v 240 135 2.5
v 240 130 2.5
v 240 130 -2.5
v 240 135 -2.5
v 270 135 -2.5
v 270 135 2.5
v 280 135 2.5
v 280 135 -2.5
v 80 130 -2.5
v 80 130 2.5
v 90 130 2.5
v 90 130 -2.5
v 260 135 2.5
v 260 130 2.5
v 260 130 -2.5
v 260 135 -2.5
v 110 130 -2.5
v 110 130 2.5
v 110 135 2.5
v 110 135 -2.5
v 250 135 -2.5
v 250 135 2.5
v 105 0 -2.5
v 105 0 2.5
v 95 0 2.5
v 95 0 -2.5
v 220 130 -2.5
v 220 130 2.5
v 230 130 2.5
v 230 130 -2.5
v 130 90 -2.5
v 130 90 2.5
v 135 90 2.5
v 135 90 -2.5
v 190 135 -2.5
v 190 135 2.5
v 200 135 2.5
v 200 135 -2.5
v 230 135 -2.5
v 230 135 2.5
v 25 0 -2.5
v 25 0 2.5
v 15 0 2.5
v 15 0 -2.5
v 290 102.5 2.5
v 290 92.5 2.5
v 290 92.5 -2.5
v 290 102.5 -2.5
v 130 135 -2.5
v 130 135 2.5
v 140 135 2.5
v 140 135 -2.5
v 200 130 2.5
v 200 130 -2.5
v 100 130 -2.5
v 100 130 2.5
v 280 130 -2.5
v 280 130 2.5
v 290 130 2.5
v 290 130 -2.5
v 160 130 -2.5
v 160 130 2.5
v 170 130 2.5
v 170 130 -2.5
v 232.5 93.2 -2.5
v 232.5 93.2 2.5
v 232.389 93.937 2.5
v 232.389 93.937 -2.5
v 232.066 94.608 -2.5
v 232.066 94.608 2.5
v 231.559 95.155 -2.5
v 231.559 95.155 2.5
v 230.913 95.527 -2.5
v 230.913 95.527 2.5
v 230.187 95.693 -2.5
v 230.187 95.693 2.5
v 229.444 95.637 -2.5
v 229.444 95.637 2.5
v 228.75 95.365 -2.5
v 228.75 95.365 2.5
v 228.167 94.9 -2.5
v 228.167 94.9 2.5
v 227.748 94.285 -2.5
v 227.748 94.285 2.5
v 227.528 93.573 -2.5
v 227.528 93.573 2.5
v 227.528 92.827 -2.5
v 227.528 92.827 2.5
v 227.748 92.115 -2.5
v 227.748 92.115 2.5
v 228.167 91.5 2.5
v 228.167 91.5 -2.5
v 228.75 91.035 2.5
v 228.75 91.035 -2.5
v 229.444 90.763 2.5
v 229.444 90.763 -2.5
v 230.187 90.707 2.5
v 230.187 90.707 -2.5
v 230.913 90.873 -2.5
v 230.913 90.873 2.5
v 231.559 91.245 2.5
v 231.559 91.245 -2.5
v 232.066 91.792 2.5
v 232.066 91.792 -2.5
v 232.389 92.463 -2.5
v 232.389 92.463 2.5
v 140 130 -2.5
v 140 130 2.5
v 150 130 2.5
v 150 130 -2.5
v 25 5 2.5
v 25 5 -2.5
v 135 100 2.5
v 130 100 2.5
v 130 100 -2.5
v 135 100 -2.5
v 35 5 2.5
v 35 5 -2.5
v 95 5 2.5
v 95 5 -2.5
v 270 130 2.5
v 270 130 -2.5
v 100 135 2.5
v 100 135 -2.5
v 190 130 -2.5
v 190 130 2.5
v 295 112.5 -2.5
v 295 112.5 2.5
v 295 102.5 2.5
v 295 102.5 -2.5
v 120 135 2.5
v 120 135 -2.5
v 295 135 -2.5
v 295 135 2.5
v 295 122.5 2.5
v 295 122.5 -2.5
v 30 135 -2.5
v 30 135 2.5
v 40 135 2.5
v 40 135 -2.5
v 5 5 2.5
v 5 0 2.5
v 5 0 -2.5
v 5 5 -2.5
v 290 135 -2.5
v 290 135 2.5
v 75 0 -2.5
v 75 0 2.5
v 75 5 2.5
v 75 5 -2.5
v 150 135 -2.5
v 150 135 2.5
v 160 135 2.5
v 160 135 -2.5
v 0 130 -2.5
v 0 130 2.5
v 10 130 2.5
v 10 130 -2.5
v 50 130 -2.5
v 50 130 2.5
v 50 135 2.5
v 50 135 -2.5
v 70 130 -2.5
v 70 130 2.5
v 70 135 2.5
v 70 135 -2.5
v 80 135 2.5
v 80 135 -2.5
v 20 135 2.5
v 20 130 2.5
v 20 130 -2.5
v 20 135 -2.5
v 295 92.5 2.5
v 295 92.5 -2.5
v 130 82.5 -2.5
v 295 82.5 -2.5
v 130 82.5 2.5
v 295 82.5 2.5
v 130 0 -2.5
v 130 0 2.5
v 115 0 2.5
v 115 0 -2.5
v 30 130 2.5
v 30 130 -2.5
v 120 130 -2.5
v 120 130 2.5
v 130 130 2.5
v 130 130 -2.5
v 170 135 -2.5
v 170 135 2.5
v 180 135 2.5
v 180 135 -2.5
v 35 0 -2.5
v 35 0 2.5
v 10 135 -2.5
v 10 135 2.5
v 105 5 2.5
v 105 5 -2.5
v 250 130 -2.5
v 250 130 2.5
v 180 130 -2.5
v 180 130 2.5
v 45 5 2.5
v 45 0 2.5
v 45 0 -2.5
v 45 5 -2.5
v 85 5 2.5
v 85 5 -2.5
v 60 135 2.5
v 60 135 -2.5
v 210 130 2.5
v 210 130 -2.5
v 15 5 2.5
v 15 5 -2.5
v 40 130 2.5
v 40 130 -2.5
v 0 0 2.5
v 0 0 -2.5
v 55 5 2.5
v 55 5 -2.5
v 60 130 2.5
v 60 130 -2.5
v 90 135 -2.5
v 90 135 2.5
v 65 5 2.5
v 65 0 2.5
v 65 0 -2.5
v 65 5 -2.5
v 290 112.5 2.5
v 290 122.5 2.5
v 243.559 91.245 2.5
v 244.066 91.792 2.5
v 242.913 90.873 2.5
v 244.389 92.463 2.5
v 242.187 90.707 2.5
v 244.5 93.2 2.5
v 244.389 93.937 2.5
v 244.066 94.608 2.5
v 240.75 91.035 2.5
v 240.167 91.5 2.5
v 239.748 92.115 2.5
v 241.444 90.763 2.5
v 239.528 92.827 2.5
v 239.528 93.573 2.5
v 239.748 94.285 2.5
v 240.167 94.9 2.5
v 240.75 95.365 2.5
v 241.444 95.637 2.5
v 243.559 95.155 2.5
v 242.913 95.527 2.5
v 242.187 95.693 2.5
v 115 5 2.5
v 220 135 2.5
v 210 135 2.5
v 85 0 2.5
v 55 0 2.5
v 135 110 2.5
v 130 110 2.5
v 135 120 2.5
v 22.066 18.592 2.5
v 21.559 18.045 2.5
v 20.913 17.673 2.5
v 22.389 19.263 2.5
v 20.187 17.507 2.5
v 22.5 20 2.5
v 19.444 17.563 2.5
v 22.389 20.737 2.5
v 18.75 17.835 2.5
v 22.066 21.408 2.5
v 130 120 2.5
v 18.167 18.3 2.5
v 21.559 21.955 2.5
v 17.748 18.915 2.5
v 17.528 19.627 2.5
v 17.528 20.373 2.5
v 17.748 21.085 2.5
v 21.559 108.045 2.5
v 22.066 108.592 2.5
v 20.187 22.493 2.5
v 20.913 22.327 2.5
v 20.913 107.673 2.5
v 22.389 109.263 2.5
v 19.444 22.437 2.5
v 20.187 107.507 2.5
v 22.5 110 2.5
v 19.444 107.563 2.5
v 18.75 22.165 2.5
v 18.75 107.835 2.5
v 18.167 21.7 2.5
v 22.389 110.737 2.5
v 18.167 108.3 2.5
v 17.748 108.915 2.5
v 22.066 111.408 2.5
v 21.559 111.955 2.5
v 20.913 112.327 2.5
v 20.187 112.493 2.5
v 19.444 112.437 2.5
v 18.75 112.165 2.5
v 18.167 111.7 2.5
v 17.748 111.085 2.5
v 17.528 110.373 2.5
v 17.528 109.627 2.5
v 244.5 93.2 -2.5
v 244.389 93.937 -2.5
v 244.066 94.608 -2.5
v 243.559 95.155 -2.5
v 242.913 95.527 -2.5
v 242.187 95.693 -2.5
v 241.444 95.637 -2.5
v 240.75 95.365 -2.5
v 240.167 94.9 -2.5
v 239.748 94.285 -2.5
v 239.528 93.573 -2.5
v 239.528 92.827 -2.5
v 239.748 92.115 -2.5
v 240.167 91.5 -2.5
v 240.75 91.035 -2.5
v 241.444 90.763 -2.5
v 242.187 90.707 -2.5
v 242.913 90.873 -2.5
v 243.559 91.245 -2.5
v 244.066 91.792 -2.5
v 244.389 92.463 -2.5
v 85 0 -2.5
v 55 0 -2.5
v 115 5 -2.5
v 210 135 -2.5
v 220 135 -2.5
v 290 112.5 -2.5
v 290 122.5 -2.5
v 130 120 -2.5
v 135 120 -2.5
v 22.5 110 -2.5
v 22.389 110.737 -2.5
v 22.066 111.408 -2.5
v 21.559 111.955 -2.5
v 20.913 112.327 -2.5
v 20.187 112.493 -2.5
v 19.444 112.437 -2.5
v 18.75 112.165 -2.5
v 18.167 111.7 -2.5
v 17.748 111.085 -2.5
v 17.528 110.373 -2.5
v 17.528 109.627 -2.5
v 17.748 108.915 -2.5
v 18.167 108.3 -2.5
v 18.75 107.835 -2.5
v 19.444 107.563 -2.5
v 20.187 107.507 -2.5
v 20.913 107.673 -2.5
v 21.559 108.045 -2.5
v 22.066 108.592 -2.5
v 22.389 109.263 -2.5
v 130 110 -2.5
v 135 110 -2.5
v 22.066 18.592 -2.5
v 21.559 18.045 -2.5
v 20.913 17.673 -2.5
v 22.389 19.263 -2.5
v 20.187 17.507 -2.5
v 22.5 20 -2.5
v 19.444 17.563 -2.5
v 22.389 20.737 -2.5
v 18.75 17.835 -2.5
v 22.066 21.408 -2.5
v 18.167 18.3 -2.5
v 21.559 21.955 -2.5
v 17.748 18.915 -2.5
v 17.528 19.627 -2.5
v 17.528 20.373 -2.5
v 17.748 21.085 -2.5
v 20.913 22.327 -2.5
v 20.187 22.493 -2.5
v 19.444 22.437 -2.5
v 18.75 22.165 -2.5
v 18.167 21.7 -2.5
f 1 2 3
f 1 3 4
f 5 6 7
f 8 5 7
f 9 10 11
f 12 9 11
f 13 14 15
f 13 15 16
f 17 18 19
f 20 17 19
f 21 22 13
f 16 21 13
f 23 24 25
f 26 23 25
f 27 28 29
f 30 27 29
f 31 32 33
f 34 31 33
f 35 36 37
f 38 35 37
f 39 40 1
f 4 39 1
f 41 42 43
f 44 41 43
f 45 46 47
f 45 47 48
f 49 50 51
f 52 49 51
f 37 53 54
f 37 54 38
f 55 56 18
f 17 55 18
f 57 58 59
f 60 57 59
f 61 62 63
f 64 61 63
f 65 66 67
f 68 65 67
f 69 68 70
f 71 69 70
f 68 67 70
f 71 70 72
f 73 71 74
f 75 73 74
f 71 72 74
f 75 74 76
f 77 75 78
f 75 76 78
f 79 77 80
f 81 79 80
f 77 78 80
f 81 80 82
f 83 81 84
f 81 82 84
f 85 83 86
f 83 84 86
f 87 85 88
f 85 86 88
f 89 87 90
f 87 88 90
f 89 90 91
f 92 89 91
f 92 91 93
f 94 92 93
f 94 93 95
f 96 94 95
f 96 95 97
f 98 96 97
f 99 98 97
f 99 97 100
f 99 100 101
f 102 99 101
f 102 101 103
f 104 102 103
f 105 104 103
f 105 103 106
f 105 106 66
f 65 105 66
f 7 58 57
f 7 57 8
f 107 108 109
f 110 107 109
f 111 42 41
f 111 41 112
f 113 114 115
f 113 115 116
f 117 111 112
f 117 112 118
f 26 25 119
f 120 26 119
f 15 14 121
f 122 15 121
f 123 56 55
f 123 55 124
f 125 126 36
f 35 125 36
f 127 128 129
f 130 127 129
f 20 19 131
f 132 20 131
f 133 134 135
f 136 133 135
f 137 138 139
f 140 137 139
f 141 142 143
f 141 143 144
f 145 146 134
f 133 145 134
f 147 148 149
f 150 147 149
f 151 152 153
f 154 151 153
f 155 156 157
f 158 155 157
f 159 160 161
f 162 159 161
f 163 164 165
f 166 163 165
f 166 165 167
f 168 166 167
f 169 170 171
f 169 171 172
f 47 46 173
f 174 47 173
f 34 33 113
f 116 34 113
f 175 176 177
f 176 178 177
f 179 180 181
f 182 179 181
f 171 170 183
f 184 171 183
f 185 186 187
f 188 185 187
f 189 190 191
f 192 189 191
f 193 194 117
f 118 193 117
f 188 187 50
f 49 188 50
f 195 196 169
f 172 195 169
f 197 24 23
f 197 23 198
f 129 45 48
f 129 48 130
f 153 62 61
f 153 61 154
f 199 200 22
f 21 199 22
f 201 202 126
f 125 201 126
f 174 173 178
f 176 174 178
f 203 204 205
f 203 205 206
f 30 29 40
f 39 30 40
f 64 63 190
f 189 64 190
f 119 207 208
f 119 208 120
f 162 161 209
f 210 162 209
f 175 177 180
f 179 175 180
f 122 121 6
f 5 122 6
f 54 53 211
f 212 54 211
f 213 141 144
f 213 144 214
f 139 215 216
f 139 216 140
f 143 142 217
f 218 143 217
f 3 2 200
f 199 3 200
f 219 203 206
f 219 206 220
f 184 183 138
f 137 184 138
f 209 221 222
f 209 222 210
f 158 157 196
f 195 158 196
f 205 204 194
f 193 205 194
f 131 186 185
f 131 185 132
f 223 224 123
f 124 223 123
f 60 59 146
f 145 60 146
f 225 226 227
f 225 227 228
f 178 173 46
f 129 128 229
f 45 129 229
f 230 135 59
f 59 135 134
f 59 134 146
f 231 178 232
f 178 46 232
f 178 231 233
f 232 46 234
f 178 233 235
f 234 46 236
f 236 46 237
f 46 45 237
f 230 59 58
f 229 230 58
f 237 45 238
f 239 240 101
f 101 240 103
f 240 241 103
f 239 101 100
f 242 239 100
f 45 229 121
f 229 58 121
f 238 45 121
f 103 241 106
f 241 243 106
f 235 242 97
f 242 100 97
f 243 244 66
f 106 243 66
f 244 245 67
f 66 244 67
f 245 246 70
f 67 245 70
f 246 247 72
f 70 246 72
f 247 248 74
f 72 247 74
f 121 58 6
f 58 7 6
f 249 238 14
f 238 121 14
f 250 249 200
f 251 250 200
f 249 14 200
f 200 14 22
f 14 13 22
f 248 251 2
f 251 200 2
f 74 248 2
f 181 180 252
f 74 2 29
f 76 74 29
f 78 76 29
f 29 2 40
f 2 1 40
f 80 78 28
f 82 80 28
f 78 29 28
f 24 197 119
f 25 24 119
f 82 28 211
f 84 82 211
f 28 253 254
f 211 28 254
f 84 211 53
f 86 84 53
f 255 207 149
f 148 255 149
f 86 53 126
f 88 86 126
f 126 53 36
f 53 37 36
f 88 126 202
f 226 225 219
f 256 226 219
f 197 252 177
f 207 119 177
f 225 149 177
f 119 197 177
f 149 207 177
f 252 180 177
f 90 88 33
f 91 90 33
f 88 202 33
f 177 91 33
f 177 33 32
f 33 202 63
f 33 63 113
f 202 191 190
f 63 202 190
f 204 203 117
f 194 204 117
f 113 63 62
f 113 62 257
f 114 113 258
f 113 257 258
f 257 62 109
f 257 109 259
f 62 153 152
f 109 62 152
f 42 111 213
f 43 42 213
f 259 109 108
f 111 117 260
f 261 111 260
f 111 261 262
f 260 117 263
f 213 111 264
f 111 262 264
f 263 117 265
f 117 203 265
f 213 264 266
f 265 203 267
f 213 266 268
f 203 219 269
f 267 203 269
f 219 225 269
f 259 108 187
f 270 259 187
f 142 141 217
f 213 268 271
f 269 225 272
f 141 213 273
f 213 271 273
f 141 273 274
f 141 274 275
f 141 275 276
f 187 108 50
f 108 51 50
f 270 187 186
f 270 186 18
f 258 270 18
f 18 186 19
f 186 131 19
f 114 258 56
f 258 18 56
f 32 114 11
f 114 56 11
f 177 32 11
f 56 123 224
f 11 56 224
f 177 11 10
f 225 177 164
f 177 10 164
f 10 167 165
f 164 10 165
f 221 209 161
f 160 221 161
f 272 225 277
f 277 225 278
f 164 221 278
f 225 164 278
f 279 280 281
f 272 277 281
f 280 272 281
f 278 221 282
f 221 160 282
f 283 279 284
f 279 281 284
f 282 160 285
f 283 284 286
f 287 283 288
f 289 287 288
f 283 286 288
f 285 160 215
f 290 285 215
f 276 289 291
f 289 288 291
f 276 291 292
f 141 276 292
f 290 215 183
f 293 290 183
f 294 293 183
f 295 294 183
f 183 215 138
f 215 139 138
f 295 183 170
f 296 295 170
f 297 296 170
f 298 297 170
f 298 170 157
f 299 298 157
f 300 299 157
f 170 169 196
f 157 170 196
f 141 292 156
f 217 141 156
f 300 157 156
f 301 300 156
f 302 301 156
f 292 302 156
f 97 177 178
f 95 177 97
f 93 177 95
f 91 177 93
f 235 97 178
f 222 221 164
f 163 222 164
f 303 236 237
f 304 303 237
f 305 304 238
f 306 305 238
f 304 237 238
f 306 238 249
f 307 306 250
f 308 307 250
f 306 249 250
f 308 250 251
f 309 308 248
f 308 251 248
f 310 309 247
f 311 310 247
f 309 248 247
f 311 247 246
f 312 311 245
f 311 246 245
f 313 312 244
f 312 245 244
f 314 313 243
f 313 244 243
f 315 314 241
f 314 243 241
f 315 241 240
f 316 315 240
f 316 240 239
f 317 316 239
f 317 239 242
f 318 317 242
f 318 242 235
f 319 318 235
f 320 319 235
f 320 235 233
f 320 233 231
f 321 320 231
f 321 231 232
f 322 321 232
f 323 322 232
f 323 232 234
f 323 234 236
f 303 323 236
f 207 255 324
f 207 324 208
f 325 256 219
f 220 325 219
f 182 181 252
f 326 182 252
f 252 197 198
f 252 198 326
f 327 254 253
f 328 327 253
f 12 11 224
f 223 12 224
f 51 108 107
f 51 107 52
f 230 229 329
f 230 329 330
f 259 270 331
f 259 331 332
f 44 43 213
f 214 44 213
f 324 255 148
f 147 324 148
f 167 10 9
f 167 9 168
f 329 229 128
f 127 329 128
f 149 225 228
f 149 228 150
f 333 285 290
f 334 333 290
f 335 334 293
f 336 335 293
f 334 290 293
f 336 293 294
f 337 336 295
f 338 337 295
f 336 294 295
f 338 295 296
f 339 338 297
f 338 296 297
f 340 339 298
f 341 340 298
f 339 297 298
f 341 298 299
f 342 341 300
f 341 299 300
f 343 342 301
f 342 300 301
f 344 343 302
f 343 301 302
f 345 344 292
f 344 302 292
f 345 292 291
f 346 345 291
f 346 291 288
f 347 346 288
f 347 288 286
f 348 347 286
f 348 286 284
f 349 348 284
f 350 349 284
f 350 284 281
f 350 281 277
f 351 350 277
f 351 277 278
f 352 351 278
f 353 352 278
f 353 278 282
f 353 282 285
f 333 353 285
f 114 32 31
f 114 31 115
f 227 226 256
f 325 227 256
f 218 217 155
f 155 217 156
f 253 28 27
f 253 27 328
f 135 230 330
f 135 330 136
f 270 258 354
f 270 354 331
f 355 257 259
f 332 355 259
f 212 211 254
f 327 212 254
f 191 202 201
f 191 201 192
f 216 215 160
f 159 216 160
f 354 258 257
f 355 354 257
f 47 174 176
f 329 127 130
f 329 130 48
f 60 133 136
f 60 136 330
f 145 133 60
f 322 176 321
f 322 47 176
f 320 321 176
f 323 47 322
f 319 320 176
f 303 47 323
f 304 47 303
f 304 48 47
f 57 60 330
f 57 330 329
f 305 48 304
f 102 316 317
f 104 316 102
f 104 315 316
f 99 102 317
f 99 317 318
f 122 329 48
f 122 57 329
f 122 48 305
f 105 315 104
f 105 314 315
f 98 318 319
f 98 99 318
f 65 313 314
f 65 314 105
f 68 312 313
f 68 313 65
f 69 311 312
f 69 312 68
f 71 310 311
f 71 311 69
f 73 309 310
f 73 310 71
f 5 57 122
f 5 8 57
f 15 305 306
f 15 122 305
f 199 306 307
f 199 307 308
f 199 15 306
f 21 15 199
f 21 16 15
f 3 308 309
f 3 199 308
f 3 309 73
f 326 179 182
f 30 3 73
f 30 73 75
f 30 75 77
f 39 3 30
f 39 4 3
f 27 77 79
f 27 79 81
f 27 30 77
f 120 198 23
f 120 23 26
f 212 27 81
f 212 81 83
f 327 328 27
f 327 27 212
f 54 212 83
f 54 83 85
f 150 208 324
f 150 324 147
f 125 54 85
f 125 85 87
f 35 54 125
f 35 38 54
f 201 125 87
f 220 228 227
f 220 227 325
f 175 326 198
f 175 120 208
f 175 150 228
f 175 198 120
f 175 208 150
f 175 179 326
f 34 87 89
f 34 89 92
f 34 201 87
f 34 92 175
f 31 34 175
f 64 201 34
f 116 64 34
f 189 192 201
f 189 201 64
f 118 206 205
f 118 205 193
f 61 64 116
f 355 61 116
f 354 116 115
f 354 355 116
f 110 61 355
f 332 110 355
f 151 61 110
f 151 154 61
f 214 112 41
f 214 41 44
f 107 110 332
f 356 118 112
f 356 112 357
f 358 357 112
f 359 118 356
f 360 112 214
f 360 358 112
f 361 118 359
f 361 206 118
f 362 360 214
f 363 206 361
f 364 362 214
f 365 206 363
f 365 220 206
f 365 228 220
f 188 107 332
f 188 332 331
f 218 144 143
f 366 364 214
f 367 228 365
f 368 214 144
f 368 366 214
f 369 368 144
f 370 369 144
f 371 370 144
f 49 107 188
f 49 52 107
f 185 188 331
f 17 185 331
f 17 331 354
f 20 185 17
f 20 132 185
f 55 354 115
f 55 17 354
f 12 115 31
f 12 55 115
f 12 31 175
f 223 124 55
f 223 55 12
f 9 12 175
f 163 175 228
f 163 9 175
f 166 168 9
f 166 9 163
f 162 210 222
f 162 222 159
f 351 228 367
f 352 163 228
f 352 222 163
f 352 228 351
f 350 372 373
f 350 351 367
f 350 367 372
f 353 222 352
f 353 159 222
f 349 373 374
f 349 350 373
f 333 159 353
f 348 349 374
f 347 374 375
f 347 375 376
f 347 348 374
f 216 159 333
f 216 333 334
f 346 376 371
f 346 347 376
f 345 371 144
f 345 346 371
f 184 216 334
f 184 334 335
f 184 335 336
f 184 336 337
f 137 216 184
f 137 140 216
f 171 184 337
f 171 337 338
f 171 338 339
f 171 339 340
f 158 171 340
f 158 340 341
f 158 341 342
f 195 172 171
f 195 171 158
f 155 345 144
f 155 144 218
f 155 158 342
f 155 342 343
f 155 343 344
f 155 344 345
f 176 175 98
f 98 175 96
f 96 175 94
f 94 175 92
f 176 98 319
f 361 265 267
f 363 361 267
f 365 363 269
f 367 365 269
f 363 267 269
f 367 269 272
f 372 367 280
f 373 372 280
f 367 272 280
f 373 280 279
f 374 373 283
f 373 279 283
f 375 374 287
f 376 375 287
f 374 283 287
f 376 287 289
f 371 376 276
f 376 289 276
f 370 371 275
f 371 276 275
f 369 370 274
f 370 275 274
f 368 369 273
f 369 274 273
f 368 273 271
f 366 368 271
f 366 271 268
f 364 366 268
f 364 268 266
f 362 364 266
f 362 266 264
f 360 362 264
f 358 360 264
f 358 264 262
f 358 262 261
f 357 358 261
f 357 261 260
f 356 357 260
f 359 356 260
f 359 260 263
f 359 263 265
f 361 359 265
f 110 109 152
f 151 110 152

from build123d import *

# Parameters (mm, degrees)
PAD_DEPTH       = 2.5
SKETCH001_W     = 5
SKETCH001_H     = 10
POCKET_DEPTH    = 5.001
SKETCH002_W     = 10
SKETCH002_H     = 5
POCKET001_DEPTH = 5.001
SKETCH003_W     = 5
SKETCH003_H     = 10
POCKET002_DEPTH = 5.001
SKETCH004_W     = 10
SKETCH004_H     = 5
POCKET003_DEPTH = 5.001
SKETCH005_R     = 2.5
POCKET004_DEPTH = 5.001
SKETCH006_R     = 2.5
POCKET005_DEPTH = 5.001


with BuildPart() as part:
    # Sketch → Pad (new body, symmetric)
    with BuildSketch(Plane.XY):
        Polygon((0, 0), (0, 135), (295, 135), (295, 82.5), (130, 82.5), (130, 0), align=None)
    extrude(amount=PAD_DEPTH, both=True)

    # Sketch001 (on Face8 of Pad) → Pocket (cut, through all)
    with BuildSketch(Plane.XY.offset(2.5)):
        with Locations((292.5, 97.5)):
            Rectangle(SKETCH001_W, SKETCH001_H)
        with Locations((292.5, 117.5)):
            Rectangle(SKETCH001_W, SKETCH001_H)
    extrude(amount=-POCKET_DEPTH, mode=Mode.SUBTRACT)

    # Sketch002 (on Face5 of Pocket) → Pocket001 (cut, through all)
    with BuildSketch(Plane.XY.offset(2.5)):
        with Locations((5, 132.5)):
            Rectangle(SKETCH002_W, SKETCH002_H)
        with Locations((25, 132.5)):
            Rectangle(SKETCH002_W, SKETCH002_H)
        with Locations((45, 132.5)):
            Rectangle(SKETCH002_W, SKETCH002_H)
        with Locations((65, 132.5)):
            Rectangle(SKETCH002_W, SKETCH002_H)
        with Locations((85, 132.5)):
            Rectangle(SKETCH002_W, SKETCH002_H)
        with Locations((105, 132.5)):
            Rectangle(SKETCH002_W, SKETCH002_H)
        with Locations((125, 132.5)):
            Rectangle(SKETCH002_W, SKETCH002_H)
        with Locations((145, 132.5)):
            Rectangle(SKETCH002_W, SKETCH002_H)
        with Locations((165, 132.5)):
            Rectangle(SKETCH002_W, SKETCH002_H)
        with Locations((185, 132.5)):
            Rectangle(SKETCH002_W, SKETCH002_H)
        with Locations((205, 132.5)):
            Rectangle(SKETCH002_W, SKETCH002_H)
        with Locations((225, 132.5)):
            Rectangle(SKETCH002_W, SKETCH002_H)
        with Locations((245, 132.5)):
            Rectangle(SKETCH002_W, SKETCH002_H)
        with Locations((265, 132.5)):
            Rectangle(SKETCH002_W, SKETCH002_H)
        with Locations((285, 132.5)):
            Rectangle(SKETCH002_W, SKETCH002_H)
    extrude(amount=-POCKET001_DEPTH, mode=Mode.SUBTRACT)

    # Sketch003 (on Face4 of Pocket001) → Pocket002 (cut, through all)
    with BuildSketch(Plane.XY.offset(2.5)):
        with Locations((132.5, 95)):
            Rectangle(SKETCH003_W, SKETCH003_H)
        with Locations((132.5, 115)):
            Rectangle(SKETCH003_W, SKETCH003_H)
    extrude(amount=-POCKET002_DEPTH, mode=Mode.SUBTRACT)

    # Sketch004 (on Face4 of Pocket002) → Pocket003 (cut, through all)
    with BuildSketch(Plane.XY.offset(2.5)):
        with Locations((10, 2.5)):
            Rectangle(SKETCH004_W, SKETCH004_H)
        with Locations((30, 2.5)):
            Rectangle(SKETCH004_W, SKETCH004_H)
        with Locations((50, 2.5)):
            Rectangle(SKETCH004_W, SKETCH004_H)
        with Locations((70, 2.5)):
            Rectangle(SKETCH004_W, SKETCH004_H)
        with Locations((90, 2.5)):
            Rectangle(SKETCH004_W, SKETCH004_H)
        with Locations((110, 2.5)):
            Rectangle(SKETCH004_W, SKETCH004_H)
    extrude(amount=-POCKET003_DEPTH, mode=Mode.SUBTRACT)

    # Sketch005 (on Face4 of Pocket003) → Pocket004 (cut, through all)
    with BuildSketch(Plane.XY.offset(2.5)):
        with Locations((20, 110)):
            Circle(SKETCH005_R)
        with Locations((20, 20)):
            Circle(SKETCH005_R)
    extrude(amount=-POCKET004_DEPTH, mode=Mode.SUBTRACT)

    # Sketch006 (on Face4 of Pocket004) → Pocket005 (cut, through all)
    with BuildSketch(Plane.XY.offset(2.5)):
        with Locations((230, 93.2)):
            Circle(SKETCH006_R)
        with Locations((242, 93.2)):
            Circle(SKETCH006_R)
    extrude(amount=-POCKET005_DEPTH, mode=Mode.SUBTRACT)


solid = part.part
